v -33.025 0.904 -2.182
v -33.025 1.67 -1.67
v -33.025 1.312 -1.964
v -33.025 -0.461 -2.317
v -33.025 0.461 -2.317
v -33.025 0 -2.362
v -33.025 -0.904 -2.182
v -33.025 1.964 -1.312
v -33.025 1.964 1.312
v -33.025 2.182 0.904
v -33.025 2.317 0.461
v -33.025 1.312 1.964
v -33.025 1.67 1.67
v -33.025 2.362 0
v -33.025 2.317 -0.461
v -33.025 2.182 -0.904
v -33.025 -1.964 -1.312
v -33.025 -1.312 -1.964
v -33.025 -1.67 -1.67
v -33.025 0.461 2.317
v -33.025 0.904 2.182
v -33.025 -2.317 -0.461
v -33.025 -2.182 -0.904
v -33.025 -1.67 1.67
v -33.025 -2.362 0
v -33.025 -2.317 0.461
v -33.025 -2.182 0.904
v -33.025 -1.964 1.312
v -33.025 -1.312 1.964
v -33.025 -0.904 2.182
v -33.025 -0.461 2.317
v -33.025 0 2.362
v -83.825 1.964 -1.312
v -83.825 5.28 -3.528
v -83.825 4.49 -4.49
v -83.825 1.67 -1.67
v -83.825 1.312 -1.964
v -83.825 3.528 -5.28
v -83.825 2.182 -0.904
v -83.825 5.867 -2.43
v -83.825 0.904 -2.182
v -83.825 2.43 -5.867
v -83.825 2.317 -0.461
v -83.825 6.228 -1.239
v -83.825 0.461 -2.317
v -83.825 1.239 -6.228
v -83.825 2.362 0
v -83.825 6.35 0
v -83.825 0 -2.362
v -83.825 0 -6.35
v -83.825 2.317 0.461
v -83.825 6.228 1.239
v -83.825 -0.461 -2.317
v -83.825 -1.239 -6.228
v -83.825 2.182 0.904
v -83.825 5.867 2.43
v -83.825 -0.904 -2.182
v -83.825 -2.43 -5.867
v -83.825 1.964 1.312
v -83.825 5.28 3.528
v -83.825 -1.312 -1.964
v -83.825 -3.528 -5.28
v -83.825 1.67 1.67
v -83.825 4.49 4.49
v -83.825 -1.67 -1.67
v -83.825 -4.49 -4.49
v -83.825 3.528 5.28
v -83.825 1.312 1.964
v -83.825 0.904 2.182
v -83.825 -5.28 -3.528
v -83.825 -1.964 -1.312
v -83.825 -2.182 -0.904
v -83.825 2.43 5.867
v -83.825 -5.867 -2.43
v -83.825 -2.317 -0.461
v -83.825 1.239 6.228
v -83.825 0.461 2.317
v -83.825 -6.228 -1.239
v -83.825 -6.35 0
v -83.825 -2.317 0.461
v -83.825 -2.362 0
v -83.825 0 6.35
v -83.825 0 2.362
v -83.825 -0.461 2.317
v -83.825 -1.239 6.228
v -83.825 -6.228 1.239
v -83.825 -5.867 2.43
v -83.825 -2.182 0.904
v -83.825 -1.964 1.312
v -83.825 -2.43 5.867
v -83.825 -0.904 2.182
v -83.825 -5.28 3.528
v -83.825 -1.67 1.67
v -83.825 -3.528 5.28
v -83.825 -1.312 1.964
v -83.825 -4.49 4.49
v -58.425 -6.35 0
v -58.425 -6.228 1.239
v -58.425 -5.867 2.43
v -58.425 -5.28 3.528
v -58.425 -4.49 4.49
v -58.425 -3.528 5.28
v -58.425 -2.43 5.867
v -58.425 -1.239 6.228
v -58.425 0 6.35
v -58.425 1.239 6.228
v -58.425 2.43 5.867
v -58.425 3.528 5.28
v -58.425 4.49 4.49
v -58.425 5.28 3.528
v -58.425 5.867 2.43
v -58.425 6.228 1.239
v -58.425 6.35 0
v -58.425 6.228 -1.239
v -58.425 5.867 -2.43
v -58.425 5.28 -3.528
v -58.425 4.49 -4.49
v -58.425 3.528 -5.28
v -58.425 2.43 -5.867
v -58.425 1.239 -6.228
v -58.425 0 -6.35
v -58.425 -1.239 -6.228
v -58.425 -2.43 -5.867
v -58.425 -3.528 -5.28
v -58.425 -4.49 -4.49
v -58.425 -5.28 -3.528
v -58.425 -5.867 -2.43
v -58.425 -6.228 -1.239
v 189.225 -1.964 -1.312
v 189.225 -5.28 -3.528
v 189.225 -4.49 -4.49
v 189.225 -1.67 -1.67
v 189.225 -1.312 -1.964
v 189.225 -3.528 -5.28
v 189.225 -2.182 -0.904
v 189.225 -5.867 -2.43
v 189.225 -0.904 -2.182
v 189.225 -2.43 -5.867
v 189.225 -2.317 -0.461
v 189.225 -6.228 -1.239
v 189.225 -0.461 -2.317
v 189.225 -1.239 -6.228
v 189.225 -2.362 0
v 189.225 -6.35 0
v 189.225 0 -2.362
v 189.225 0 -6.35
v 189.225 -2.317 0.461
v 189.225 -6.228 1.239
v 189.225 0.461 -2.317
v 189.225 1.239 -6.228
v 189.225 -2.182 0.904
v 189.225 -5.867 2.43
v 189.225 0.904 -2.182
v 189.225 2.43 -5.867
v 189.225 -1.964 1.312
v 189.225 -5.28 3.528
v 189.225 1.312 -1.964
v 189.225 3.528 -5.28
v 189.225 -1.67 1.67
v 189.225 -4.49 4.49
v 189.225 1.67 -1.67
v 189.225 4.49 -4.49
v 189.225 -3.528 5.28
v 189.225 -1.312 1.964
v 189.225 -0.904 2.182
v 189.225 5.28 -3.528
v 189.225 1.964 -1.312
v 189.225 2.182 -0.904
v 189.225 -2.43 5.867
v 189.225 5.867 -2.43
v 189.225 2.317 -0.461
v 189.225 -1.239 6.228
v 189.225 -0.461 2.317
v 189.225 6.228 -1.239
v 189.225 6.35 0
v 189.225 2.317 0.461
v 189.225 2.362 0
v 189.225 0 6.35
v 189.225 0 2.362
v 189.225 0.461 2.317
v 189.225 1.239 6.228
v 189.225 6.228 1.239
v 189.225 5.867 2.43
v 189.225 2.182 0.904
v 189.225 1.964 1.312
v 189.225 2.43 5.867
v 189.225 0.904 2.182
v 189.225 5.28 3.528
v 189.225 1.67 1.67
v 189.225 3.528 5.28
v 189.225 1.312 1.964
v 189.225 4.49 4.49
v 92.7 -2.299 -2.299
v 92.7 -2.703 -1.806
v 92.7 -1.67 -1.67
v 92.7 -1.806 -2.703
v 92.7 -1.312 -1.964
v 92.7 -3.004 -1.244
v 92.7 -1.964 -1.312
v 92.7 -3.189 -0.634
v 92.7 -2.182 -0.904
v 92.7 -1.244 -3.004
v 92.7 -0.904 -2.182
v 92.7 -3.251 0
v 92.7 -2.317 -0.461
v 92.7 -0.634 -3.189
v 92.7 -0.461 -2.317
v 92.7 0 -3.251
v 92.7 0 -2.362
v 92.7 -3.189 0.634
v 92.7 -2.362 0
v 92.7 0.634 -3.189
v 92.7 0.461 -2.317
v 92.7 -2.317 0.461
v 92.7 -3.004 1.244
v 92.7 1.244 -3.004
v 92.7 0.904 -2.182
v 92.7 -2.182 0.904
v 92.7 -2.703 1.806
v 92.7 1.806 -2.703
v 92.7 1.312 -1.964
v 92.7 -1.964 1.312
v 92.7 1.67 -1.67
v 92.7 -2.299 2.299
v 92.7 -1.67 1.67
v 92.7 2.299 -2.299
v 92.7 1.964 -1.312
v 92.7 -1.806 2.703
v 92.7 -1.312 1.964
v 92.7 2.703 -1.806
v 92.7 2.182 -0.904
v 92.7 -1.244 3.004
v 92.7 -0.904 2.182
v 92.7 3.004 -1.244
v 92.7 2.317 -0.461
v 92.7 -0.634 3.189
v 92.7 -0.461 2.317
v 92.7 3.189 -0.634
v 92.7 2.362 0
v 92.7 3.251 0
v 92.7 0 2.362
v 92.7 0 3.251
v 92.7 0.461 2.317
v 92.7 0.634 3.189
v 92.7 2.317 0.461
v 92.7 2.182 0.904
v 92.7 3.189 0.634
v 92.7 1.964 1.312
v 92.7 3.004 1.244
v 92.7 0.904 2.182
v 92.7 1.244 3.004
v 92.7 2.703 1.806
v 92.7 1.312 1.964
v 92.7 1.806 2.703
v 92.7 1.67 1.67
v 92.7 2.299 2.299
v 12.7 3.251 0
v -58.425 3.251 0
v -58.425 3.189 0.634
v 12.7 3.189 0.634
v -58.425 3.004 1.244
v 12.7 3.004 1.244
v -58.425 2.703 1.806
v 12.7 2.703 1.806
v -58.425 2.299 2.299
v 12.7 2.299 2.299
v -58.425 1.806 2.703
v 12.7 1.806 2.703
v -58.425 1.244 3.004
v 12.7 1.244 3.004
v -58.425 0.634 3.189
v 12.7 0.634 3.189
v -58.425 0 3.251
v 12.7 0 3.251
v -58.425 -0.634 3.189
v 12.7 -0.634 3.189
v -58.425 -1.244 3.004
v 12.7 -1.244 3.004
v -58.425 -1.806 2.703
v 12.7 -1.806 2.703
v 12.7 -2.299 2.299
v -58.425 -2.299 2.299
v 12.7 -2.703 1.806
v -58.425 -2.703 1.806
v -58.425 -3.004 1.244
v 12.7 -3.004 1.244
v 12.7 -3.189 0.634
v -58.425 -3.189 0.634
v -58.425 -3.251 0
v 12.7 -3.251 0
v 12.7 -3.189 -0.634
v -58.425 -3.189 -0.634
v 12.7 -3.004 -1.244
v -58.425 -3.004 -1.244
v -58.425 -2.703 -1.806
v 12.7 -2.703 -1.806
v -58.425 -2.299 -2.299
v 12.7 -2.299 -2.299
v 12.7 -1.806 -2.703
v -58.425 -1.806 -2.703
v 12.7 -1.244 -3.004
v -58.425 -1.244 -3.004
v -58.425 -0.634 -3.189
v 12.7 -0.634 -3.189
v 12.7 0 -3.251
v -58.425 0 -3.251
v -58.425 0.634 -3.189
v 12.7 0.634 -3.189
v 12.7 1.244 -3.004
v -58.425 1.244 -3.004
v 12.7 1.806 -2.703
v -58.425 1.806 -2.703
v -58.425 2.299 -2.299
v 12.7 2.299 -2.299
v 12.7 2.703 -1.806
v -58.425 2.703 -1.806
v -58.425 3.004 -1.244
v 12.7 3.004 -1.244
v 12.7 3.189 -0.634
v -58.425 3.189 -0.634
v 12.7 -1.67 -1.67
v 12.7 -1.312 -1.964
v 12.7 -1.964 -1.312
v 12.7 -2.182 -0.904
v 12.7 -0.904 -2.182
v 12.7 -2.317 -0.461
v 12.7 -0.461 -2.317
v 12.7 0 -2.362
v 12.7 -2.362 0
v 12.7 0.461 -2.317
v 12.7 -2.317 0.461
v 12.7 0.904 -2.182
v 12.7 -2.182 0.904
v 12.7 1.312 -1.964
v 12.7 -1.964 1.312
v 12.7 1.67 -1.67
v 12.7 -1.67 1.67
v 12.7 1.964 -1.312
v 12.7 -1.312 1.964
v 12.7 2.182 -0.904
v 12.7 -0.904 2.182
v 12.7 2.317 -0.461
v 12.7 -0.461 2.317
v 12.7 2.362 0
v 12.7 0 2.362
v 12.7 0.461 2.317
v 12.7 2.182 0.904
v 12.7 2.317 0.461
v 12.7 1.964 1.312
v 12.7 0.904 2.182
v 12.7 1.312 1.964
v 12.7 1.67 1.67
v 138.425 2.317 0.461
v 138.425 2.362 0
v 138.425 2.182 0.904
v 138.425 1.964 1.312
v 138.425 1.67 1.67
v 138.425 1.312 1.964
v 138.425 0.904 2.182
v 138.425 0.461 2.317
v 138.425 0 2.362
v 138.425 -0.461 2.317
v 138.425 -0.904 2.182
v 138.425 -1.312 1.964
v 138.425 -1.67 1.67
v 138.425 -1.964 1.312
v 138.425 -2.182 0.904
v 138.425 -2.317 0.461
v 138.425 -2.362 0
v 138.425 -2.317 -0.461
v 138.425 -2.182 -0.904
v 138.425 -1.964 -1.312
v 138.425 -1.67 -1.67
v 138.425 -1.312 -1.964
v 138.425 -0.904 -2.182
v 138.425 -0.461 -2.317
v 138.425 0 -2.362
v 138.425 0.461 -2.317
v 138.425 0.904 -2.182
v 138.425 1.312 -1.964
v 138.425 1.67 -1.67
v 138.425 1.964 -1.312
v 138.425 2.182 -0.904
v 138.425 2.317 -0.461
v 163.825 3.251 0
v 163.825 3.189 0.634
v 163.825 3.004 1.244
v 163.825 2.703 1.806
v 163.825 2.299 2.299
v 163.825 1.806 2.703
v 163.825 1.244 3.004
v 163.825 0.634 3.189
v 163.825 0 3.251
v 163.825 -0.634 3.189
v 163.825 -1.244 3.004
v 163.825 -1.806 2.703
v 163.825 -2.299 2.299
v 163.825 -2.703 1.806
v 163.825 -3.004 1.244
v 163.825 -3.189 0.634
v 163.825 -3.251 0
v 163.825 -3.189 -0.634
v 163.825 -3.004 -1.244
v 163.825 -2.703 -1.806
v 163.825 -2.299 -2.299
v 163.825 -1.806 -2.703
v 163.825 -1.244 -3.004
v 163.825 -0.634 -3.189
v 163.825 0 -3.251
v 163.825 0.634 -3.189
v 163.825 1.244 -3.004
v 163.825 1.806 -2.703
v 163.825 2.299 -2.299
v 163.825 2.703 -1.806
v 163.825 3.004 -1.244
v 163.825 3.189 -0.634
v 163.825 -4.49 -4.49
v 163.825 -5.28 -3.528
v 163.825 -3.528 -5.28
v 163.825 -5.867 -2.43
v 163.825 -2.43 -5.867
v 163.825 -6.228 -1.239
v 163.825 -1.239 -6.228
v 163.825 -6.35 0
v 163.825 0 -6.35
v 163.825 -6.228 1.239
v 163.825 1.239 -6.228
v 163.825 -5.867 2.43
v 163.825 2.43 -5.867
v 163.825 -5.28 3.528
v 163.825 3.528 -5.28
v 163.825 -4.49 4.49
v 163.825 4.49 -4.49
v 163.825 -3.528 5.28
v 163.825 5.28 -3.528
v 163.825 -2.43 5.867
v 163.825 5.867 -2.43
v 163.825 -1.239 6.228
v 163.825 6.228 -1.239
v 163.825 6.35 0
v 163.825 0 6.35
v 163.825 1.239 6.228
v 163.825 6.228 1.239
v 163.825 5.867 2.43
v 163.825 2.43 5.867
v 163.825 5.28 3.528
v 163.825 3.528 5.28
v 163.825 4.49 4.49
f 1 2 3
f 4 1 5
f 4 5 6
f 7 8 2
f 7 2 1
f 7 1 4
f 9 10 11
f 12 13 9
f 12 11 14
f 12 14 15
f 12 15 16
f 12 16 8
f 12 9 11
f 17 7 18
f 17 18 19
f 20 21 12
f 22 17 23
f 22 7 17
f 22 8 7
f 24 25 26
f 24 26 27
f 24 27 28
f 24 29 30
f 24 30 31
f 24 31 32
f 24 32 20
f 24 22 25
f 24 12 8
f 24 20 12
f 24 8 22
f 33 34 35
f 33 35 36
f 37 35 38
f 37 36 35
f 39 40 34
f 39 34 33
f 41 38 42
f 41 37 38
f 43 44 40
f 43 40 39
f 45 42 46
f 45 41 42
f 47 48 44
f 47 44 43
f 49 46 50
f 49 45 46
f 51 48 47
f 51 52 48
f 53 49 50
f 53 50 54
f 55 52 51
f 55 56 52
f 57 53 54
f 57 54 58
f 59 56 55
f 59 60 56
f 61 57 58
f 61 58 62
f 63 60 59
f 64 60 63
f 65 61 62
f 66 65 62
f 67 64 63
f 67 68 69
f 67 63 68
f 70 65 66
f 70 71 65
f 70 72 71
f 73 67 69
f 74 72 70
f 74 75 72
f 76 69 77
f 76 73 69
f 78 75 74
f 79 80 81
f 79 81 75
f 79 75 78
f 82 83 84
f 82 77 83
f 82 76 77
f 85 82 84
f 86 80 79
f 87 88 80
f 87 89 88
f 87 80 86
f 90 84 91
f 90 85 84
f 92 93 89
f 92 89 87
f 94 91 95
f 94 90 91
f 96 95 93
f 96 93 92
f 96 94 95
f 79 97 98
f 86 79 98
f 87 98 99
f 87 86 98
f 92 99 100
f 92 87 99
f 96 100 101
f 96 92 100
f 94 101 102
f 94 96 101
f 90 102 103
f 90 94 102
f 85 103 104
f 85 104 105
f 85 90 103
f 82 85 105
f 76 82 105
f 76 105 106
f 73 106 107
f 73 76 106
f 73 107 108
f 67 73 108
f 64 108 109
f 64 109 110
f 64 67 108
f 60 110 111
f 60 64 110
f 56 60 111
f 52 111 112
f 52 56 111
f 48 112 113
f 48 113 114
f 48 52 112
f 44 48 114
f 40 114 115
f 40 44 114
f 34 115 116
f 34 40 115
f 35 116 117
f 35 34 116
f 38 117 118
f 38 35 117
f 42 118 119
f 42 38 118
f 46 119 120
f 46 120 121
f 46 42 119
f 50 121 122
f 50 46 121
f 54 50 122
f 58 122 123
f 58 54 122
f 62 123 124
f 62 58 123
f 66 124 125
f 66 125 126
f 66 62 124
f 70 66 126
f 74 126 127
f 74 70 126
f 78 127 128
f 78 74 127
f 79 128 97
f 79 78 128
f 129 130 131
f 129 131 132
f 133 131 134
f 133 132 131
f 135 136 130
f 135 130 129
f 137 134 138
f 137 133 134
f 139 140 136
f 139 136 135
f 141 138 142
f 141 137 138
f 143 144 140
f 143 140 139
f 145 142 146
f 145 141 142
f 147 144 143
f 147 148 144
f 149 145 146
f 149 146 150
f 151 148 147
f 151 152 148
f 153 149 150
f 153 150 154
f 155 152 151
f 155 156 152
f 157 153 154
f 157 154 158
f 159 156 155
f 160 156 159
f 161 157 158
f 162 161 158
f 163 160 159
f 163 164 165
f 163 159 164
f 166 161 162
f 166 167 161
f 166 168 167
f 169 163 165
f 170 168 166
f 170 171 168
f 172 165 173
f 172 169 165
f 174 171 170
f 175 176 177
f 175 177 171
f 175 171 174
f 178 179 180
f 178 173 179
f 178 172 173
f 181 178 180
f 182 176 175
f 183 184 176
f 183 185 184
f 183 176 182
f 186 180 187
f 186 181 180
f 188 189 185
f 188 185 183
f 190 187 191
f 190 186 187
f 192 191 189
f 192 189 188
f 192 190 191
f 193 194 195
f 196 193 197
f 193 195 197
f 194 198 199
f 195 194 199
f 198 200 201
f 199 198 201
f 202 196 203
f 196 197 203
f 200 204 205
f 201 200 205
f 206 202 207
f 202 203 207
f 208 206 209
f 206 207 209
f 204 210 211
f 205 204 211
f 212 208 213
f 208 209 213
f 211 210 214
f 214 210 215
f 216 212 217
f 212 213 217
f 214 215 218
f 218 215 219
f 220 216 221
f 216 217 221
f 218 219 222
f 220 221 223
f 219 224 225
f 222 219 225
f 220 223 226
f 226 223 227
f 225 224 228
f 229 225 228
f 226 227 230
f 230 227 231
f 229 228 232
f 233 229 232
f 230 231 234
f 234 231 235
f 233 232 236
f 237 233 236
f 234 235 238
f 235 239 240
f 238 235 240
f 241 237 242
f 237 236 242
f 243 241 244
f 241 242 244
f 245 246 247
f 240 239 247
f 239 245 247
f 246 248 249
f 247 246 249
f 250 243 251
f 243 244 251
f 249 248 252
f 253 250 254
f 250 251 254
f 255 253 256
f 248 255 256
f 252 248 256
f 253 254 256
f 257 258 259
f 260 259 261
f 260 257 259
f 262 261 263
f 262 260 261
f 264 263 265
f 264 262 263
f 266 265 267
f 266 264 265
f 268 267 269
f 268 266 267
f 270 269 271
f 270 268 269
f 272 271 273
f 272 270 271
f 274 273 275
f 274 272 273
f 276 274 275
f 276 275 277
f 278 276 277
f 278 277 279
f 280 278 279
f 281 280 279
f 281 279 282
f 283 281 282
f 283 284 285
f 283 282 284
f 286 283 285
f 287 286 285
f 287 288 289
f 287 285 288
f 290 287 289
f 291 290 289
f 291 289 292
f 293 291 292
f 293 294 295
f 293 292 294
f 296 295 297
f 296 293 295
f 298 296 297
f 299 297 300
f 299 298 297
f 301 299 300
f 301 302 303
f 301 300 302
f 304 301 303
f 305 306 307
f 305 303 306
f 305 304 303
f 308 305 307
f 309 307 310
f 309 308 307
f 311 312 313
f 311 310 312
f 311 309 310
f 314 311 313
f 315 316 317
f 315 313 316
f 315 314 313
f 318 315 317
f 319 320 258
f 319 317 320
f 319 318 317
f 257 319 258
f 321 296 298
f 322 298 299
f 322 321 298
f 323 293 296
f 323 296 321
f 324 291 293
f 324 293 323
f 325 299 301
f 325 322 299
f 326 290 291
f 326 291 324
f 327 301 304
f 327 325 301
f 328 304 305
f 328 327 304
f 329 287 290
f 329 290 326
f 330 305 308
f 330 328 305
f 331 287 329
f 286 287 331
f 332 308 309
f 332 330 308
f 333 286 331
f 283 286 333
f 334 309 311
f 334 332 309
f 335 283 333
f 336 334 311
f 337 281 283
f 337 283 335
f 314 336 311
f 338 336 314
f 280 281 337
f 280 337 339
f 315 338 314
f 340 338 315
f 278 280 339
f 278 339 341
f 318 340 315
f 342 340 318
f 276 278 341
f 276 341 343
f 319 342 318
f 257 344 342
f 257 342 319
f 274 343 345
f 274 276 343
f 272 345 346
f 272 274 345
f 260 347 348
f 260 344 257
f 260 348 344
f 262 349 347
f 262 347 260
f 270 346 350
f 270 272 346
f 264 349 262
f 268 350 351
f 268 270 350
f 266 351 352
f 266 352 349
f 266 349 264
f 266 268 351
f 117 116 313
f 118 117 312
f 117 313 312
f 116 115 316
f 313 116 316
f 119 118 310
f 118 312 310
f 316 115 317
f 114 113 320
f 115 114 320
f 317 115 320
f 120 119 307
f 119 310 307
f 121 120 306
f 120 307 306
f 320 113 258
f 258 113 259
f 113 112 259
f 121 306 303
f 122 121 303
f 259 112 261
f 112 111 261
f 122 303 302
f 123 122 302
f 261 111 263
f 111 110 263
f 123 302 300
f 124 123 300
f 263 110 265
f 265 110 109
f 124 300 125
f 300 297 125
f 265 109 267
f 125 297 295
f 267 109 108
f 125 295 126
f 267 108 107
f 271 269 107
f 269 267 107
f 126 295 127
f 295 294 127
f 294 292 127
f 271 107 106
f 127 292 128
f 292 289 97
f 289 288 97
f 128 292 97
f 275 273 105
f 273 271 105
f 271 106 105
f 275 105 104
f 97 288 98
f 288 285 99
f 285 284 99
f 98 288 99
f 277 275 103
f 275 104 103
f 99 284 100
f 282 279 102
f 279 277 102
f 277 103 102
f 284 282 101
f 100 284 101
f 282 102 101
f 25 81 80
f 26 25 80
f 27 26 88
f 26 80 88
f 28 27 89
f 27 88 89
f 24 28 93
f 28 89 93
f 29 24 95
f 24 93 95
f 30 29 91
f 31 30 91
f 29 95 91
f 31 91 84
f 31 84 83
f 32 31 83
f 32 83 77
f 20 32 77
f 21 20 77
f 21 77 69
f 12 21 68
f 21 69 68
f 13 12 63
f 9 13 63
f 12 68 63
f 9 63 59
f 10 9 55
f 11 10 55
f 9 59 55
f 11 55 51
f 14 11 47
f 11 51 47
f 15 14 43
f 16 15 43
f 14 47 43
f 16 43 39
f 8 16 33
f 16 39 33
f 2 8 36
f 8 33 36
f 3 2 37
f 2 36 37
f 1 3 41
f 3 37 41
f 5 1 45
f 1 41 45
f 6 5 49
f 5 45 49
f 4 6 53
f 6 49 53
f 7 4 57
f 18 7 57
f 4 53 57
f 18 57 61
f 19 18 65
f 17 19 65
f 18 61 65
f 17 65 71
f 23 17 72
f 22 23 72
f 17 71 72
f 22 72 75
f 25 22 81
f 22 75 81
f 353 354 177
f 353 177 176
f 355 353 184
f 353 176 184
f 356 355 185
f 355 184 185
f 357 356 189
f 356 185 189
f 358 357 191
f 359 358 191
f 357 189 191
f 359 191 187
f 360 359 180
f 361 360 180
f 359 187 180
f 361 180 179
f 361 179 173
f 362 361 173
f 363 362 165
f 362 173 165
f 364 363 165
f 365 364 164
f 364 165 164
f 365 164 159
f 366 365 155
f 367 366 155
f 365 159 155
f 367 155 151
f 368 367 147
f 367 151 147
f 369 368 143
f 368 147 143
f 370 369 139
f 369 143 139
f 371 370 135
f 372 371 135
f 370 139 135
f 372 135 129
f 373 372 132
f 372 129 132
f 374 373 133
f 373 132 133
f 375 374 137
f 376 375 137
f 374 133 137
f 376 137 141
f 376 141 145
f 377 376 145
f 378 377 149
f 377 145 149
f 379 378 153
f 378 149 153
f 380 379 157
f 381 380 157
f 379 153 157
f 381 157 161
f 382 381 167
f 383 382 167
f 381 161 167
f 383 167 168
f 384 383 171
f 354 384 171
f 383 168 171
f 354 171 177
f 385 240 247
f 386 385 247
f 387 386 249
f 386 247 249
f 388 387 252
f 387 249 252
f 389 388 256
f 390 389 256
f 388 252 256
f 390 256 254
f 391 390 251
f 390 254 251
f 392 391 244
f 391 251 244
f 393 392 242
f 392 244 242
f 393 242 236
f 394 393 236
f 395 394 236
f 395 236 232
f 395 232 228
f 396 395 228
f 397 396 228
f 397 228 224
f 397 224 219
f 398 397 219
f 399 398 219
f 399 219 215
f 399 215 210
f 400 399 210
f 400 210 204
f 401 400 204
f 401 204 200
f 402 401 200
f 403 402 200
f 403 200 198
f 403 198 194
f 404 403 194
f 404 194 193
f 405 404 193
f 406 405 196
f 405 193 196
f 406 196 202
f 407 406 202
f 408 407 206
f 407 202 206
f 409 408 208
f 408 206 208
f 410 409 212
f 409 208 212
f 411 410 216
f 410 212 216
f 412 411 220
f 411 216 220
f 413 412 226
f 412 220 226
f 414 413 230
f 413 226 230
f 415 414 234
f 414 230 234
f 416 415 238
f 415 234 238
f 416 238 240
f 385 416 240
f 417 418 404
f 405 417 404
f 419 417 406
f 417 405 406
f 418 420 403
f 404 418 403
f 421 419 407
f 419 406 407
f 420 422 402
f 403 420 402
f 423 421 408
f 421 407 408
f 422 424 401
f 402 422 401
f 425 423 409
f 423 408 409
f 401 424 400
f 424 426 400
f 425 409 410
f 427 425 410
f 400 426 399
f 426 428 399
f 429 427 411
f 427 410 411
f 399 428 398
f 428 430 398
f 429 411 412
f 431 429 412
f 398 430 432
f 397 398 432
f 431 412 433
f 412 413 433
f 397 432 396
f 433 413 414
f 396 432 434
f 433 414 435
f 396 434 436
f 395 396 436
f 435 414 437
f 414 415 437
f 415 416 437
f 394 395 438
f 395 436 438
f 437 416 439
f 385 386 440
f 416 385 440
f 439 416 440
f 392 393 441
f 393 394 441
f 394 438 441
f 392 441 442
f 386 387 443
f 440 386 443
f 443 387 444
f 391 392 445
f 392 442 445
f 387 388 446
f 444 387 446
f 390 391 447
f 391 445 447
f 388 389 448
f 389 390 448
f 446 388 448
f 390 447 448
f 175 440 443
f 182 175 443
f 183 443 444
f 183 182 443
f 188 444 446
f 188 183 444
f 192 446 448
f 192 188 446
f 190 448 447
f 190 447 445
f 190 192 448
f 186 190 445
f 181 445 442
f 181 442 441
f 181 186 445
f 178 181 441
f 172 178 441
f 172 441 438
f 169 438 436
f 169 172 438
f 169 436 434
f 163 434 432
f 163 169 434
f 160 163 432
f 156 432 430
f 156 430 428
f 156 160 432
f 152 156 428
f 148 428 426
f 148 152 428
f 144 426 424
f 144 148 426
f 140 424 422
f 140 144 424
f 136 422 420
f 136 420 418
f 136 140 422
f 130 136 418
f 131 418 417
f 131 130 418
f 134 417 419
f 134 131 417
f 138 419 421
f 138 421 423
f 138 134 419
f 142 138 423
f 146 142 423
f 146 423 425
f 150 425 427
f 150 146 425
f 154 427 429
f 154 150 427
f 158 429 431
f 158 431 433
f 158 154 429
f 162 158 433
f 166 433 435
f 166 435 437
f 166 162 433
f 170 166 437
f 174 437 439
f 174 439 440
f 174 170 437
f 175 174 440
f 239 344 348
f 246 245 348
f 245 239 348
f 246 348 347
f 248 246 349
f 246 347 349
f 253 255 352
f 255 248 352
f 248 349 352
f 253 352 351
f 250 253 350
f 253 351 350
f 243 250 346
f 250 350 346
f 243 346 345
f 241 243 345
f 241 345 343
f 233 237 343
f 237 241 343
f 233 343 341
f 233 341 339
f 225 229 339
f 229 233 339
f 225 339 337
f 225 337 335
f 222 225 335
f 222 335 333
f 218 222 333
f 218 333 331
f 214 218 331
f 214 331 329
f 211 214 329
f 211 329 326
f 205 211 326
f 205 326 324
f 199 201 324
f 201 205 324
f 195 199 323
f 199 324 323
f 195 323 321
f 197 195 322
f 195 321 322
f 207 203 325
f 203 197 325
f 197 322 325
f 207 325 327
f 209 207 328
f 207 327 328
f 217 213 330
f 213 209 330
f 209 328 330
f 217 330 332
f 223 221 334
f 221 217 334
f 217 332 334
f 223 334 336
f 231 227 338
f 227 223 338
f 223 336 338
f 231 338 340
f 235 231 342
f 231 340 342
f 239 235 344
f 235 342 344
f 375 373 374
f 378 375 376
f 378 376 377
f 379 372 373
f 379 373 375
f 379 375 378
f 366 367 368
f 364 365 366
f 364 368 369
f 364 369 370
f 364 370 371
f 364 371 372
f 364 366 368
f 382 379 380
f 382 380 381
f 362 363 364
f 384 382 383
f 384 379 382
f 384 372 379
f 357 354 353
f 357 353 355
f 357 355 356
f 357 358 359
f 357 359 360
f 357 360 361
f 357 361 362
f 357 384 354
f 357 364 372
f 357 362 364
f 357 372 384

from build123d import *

# Parameters (mm, degrees)
F0_R      = 2.3622
F1_DEPTH  = 105.39984
F3_R      = 3.2512
F4_DEPTH  = 96.52508
F6_R      = 3.2512
F7_DEPTH  = 96.52508
F8_R      = 6.35
F8_R_2    = 3.2512
F9_DEPTH  = 25.4
F10_R     = 2.3622
F11_DEPTH = 50.8
F12_R     = 6.35
F12_R_2   = 3.2512
F13_DEPTH = 25.4
F14_R     = 2.3622
F15_DEPTH = 50.8


with BuildPart() as f1:
    # F0 (on Right) → F1 (new body)
    with BuildSketch(Plane.YZ):
        Circle(F0_R)
    extrude(amount=F1_DEPTH)

    # F3 (on offset) → F4 (join)
    with BuildSketch(Plane.YZ.offset(12.7)):
        Circle(F3_R)
    extrude(amount=-F4_DEPTH)

    # F6 (on offset) → F7 (join)
    with BuildSketch(Plane.YZ.offset(92.69984)):
        Circle(F6_R)
    extrude(amount=F7_DEPTH)

    # F8 (on face) → F9 (join)
    with BuildSketch(Plane(origin=(-83.82508, 0, 0), x_dir=(0, -1, 0), z_dir=(-1, 0, 0))):
        Circle(F8_R)
        Circle(F8_R_2, mode=Mode.SUBTRACT)
    extrude(amount=-F9_DEPTH)

    # F10 (on face) → F11 (cut)
    with BuildSketch(Plane(origin=(-83.82508, 0, 0), x_dir=(0, -1, 0), z_dir=(-1, 0, 0))):
        Circle(F10_R)
    extrude(amount=-F11_DEPTH, mode=Mode.SUBTRACT)

    # F12 (on face) → F13 (join)
    with BuildSketch(Plane.YZ.offset(189.22492)):
        Circle(F12_R)
        Circle(F12_R_2, mode=Mode.SUBTRACT)
    extrude(amount=-F13_DEPTH)

    # F14 (on face) → F15 (cut)
    with BuildSketch(Plane.YZ.offset(189.22492)):
        Circle(F14_R)
    extrude(amount=-F15_DEPTH, mode=Mode.SUBTRACT)


solid = f1.part
